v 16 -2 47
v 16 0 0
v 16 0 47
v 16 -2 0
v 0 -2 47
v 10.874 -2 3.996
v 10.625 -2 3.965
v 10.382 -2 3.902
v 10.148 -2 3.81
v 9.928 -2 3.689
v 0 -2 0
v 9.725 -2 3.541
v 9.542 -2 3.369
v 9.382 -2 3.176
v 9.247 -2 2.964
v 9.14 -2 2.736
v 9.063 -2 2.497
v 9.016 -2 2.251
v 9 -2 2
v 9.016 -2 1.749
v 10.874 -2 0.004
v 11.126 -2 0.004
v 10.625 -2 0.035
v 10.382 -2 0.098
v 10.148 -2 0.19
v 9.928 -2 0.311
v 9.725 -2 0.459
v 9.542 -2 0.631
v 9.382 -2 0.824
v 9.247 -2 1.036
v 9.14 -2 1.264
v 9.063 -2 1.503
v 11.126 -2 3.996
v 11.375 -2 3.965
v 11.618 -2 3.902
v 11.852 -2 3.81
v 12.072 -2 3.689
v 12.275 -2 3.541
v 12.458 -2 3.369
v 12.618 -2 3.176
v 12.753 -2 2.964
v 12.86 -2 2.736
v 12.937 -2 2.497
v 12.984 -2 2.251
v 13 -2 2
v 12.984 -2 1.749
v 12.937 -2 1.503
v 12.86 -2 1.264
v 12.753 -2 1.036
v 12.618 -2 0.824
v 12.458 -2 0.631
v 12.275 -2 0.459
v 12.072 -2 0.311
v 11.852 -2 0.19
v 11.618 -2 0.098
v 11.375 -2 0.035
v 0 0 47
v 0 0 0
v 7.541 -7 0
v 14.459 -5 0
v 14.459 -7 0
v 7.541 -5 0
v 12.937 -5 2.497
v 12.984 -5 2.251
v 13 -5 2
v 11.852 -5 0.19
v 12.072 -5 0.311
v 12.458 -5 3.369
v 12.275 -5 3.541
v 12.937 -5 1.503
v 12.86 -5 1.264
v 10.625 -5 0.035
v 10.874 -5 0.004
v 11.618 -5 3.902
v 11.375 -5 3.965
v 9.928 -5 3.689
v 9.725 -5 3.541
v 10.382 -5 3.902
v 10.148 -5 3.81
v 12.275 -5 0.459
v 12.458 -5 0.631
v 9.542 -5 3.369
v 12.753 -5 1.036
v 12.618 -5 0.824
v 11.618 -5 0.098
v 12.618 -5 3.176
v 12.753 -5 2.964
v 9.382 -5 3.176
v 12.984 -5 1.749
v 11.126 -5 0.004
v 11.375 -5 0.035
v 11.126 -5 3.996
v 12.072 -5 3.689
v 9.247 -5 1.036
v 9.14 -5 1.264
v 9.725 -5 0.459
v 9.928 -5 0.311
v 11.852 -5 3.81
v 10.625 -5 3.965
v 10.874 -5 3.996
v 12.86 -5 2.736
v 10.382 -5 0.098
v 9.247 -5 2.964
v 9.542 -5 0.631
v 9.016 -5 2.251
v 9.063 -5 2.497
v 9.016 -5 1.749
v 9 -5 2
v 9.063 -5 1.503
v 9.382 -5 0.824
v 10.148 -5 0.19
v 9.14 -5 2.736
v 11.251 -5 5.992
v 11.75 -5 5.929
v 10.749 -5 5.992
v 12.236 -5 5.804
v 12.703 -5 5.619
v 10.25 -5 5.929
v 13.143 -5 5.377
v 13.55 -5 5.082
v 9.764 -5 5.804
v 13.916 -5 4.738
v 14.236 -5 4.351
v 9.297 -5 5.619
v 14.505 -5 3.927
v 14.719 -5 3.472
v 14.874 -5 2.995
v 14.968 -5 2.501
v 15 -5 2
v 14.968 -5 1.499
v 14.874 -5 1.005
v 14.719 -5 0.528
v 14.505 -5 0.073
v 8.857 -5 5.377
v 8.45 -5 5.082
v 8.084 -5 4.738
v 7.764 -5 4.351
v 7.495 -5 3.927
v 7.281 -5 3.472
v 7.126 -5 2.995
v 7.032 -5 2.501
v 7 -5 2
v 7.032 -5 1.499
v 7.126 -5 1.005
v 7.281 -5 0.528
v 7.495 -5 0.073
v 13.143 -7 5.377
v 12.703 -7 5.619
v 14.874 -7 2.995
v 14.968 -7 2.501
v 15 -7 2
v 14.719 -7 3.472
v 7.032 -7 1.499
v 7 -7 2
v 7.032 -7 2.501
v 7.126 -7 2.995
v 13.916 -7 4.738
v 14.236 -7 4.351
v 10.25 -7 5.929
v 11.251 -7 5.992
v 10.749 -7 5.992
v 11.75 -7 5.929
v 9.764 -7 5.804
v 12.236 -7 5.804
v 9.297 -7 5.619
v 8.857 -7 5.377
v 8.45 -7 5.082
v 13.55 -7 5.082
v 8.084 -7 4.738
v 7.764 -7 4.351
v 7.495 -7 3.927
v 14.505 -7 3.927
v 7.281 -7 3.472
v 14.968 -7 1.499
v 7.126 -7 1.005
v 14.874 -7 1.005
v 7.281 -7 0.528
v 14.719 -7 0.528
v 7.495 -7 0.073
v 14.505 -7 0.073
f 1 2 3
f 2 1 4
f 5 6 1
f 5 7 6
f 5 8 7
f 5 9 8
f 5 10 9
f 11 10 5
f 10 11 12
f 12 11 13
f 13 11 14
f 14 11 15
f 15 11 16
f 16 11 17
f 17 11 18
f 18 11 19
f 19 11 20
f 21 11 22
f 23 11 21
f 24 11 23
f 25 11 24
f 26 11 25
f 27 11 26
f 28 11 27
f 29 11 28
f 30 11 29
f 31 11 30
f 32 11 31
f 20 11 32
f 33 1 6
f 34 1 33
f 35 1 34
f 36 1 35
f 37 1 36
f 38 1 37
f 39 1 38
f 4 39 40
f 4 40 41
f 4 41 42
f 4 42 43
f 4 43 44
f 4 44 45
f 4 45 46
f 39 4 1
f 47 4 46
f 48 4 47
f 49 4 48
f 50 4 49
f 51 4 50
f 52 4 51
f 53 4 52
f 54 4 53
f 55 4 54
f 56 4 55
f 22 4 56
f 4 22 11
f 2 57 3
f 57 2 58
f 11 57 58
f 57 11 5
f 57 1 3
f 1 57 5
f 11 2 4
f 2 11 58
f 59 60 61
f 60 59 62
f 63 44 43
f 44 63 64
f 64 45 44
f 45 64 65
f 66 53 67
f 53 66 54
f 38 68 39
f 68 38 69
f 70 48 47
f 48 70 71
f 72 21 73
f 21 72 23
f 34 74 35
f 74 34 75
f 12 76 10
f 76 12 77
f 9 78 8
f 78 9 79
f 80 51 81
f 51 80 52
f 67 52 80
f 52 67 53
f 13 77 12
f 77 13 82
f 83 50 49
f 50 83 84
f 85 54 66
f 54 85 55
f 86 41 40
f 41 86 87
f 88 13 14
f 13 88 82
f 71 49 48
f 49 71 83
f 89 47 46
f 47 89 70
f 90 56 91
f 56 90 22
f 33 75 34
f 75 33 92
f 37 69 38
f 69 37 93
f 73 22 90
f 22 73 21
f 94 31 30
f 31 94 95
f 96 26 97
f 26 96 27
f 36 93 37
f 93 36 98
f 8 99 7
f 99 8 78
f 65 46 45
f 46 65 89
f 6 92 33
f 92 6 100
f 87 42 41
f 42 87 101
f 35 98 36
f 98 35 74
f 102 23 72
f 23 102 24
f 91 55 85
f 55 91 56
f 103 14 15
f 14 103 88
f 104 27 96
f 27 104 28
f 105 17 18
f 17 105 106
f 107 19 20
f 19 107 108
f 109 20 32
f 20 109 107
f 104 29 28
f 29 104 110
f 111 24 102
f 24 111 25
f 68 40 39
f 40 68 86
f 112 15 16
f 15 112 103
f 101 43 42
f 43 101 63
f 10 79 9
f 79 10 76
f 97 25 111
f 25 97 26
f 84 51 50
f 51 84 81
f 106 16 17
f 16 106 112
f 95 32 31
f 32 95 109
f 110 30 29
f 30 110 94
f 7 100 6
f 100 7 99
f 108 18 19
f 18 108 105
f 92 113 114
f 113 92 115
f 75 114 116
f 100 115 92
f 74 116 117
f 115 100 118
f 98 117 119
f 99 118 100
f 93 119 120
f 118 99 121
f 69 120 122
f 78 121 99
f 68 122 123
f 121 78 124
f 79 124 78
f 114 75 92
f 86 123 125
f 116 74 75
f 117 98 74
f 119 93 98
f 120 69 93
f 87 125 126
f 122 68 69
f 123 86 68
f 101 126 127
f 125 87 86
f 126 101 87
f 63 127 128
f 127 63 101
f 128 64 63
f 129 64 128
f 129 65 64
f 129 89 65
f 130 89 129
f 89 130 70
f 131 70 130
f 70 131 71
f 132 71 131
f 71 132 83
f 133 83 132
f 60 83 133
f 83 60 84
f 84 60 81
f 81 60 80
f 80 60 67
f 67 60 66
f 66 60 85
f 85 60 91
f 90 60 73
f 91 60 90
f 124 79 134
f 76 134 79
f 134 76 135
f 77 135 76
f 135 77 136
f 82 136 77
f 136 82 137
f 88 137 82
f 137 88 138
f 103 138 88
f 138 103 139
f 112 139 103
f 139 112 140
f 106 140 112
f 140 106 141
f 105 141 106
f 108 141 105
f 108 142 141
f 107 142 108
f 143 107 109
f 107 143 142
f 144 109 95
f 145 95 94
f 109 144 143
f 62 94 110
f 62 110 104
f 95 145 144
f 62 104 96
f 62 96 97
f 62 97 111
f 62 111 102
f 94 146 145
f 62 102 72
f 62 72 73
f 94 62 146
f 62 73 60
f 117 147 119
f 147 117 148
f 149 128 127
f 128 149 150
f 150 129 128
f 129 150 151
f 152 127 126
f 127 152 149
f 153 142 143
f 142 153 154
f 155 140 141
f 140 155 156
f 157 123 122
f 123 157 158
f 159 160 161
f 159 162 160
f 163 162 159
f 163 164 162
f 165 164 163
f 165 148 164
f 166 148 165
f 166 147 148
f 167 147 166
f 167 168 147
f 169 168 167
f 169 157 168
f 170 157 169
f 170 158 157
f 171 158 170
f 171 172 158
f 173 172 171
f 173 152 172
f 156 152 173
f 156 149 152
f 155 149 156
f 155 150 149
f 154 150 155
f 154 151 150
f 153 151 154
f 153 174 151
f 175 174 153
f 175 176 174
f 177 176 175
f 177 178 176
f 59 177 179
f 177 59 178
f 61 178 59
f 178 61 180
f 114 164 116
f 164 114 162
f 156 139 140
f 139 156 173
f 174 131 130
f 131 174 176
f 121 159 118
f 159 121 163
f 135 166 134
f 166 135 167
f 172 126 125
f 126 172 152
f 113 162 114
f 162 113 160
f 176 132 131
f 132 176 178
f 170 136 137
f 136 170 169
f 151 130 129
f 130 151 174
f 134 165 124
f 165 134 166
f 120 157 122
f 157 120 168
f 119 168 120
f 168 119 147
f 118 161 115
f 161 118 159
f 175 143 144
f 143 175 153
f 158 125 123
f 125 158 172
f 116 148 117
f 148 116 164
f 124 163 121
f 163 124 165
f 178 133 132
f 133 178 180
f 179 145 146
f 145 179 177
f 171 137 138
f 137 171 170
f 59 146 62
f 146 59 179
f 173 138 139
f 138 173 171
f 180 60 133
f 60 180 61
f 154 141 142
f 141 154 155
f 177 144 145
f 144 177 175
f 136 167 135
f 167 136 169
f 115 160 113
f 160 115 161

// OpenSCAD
/*
I designed this hanger peg to hang things on the wall using the various 3M Command Strips which I'm a big fan off.
I have a bunch of things that have those little "keyhole" hanger points that you're supposed to slip over a nail 
or screw head but I don't like making holes in my walls especially when the item doesn't weigh very much. So I made 
this design to attach to the wall with a Command Strip designed to hold the weight and then hang your item on the peg.
The normal Poster strips are supposed to be able to hold up 0.5 pounds which is plenty for many small things. Need 
to hang something bigger like a drill battery holder?  Scale up the base for a bigger Command Strip for more weight.
*/

$fn=50;

// This should be the size of the command strip
baseW = 16;
baseL = 47;
baseH = 2;
baseC = "blue";

// This is the size of the small part of the keyhole
pegD = 4;  // width of the small part
pegH = 3;  // thickness of the small part
pegC = "green";

// This is the size of the big part of the keyhole
capD = 8;  // width of the big part
capH = 2;  // thickness of the big part
capC = "red";
rotate([90,0,0]) // I would print it standing on end so the the layers are perpendicular to the shear stress on the peg
difference(){
  union(){
    color(baseC) cube([baseW, baseL, baseH]);
    translate([baseW/2+3,pegD/2, baseH])
      color(pegC) cylinder(d=pegD, h=pegH);
    translate([baseW/2+3,pegD/2, baseH+pegH])
      color(capC) cylinder(d=capD, h=capH);
  }
  //slice a flat base on it for easier printing.
  translate([0,-(capD-pegD),0])
    cube([baseW,capD-pegD,baseH+pegH+capH]);
}
